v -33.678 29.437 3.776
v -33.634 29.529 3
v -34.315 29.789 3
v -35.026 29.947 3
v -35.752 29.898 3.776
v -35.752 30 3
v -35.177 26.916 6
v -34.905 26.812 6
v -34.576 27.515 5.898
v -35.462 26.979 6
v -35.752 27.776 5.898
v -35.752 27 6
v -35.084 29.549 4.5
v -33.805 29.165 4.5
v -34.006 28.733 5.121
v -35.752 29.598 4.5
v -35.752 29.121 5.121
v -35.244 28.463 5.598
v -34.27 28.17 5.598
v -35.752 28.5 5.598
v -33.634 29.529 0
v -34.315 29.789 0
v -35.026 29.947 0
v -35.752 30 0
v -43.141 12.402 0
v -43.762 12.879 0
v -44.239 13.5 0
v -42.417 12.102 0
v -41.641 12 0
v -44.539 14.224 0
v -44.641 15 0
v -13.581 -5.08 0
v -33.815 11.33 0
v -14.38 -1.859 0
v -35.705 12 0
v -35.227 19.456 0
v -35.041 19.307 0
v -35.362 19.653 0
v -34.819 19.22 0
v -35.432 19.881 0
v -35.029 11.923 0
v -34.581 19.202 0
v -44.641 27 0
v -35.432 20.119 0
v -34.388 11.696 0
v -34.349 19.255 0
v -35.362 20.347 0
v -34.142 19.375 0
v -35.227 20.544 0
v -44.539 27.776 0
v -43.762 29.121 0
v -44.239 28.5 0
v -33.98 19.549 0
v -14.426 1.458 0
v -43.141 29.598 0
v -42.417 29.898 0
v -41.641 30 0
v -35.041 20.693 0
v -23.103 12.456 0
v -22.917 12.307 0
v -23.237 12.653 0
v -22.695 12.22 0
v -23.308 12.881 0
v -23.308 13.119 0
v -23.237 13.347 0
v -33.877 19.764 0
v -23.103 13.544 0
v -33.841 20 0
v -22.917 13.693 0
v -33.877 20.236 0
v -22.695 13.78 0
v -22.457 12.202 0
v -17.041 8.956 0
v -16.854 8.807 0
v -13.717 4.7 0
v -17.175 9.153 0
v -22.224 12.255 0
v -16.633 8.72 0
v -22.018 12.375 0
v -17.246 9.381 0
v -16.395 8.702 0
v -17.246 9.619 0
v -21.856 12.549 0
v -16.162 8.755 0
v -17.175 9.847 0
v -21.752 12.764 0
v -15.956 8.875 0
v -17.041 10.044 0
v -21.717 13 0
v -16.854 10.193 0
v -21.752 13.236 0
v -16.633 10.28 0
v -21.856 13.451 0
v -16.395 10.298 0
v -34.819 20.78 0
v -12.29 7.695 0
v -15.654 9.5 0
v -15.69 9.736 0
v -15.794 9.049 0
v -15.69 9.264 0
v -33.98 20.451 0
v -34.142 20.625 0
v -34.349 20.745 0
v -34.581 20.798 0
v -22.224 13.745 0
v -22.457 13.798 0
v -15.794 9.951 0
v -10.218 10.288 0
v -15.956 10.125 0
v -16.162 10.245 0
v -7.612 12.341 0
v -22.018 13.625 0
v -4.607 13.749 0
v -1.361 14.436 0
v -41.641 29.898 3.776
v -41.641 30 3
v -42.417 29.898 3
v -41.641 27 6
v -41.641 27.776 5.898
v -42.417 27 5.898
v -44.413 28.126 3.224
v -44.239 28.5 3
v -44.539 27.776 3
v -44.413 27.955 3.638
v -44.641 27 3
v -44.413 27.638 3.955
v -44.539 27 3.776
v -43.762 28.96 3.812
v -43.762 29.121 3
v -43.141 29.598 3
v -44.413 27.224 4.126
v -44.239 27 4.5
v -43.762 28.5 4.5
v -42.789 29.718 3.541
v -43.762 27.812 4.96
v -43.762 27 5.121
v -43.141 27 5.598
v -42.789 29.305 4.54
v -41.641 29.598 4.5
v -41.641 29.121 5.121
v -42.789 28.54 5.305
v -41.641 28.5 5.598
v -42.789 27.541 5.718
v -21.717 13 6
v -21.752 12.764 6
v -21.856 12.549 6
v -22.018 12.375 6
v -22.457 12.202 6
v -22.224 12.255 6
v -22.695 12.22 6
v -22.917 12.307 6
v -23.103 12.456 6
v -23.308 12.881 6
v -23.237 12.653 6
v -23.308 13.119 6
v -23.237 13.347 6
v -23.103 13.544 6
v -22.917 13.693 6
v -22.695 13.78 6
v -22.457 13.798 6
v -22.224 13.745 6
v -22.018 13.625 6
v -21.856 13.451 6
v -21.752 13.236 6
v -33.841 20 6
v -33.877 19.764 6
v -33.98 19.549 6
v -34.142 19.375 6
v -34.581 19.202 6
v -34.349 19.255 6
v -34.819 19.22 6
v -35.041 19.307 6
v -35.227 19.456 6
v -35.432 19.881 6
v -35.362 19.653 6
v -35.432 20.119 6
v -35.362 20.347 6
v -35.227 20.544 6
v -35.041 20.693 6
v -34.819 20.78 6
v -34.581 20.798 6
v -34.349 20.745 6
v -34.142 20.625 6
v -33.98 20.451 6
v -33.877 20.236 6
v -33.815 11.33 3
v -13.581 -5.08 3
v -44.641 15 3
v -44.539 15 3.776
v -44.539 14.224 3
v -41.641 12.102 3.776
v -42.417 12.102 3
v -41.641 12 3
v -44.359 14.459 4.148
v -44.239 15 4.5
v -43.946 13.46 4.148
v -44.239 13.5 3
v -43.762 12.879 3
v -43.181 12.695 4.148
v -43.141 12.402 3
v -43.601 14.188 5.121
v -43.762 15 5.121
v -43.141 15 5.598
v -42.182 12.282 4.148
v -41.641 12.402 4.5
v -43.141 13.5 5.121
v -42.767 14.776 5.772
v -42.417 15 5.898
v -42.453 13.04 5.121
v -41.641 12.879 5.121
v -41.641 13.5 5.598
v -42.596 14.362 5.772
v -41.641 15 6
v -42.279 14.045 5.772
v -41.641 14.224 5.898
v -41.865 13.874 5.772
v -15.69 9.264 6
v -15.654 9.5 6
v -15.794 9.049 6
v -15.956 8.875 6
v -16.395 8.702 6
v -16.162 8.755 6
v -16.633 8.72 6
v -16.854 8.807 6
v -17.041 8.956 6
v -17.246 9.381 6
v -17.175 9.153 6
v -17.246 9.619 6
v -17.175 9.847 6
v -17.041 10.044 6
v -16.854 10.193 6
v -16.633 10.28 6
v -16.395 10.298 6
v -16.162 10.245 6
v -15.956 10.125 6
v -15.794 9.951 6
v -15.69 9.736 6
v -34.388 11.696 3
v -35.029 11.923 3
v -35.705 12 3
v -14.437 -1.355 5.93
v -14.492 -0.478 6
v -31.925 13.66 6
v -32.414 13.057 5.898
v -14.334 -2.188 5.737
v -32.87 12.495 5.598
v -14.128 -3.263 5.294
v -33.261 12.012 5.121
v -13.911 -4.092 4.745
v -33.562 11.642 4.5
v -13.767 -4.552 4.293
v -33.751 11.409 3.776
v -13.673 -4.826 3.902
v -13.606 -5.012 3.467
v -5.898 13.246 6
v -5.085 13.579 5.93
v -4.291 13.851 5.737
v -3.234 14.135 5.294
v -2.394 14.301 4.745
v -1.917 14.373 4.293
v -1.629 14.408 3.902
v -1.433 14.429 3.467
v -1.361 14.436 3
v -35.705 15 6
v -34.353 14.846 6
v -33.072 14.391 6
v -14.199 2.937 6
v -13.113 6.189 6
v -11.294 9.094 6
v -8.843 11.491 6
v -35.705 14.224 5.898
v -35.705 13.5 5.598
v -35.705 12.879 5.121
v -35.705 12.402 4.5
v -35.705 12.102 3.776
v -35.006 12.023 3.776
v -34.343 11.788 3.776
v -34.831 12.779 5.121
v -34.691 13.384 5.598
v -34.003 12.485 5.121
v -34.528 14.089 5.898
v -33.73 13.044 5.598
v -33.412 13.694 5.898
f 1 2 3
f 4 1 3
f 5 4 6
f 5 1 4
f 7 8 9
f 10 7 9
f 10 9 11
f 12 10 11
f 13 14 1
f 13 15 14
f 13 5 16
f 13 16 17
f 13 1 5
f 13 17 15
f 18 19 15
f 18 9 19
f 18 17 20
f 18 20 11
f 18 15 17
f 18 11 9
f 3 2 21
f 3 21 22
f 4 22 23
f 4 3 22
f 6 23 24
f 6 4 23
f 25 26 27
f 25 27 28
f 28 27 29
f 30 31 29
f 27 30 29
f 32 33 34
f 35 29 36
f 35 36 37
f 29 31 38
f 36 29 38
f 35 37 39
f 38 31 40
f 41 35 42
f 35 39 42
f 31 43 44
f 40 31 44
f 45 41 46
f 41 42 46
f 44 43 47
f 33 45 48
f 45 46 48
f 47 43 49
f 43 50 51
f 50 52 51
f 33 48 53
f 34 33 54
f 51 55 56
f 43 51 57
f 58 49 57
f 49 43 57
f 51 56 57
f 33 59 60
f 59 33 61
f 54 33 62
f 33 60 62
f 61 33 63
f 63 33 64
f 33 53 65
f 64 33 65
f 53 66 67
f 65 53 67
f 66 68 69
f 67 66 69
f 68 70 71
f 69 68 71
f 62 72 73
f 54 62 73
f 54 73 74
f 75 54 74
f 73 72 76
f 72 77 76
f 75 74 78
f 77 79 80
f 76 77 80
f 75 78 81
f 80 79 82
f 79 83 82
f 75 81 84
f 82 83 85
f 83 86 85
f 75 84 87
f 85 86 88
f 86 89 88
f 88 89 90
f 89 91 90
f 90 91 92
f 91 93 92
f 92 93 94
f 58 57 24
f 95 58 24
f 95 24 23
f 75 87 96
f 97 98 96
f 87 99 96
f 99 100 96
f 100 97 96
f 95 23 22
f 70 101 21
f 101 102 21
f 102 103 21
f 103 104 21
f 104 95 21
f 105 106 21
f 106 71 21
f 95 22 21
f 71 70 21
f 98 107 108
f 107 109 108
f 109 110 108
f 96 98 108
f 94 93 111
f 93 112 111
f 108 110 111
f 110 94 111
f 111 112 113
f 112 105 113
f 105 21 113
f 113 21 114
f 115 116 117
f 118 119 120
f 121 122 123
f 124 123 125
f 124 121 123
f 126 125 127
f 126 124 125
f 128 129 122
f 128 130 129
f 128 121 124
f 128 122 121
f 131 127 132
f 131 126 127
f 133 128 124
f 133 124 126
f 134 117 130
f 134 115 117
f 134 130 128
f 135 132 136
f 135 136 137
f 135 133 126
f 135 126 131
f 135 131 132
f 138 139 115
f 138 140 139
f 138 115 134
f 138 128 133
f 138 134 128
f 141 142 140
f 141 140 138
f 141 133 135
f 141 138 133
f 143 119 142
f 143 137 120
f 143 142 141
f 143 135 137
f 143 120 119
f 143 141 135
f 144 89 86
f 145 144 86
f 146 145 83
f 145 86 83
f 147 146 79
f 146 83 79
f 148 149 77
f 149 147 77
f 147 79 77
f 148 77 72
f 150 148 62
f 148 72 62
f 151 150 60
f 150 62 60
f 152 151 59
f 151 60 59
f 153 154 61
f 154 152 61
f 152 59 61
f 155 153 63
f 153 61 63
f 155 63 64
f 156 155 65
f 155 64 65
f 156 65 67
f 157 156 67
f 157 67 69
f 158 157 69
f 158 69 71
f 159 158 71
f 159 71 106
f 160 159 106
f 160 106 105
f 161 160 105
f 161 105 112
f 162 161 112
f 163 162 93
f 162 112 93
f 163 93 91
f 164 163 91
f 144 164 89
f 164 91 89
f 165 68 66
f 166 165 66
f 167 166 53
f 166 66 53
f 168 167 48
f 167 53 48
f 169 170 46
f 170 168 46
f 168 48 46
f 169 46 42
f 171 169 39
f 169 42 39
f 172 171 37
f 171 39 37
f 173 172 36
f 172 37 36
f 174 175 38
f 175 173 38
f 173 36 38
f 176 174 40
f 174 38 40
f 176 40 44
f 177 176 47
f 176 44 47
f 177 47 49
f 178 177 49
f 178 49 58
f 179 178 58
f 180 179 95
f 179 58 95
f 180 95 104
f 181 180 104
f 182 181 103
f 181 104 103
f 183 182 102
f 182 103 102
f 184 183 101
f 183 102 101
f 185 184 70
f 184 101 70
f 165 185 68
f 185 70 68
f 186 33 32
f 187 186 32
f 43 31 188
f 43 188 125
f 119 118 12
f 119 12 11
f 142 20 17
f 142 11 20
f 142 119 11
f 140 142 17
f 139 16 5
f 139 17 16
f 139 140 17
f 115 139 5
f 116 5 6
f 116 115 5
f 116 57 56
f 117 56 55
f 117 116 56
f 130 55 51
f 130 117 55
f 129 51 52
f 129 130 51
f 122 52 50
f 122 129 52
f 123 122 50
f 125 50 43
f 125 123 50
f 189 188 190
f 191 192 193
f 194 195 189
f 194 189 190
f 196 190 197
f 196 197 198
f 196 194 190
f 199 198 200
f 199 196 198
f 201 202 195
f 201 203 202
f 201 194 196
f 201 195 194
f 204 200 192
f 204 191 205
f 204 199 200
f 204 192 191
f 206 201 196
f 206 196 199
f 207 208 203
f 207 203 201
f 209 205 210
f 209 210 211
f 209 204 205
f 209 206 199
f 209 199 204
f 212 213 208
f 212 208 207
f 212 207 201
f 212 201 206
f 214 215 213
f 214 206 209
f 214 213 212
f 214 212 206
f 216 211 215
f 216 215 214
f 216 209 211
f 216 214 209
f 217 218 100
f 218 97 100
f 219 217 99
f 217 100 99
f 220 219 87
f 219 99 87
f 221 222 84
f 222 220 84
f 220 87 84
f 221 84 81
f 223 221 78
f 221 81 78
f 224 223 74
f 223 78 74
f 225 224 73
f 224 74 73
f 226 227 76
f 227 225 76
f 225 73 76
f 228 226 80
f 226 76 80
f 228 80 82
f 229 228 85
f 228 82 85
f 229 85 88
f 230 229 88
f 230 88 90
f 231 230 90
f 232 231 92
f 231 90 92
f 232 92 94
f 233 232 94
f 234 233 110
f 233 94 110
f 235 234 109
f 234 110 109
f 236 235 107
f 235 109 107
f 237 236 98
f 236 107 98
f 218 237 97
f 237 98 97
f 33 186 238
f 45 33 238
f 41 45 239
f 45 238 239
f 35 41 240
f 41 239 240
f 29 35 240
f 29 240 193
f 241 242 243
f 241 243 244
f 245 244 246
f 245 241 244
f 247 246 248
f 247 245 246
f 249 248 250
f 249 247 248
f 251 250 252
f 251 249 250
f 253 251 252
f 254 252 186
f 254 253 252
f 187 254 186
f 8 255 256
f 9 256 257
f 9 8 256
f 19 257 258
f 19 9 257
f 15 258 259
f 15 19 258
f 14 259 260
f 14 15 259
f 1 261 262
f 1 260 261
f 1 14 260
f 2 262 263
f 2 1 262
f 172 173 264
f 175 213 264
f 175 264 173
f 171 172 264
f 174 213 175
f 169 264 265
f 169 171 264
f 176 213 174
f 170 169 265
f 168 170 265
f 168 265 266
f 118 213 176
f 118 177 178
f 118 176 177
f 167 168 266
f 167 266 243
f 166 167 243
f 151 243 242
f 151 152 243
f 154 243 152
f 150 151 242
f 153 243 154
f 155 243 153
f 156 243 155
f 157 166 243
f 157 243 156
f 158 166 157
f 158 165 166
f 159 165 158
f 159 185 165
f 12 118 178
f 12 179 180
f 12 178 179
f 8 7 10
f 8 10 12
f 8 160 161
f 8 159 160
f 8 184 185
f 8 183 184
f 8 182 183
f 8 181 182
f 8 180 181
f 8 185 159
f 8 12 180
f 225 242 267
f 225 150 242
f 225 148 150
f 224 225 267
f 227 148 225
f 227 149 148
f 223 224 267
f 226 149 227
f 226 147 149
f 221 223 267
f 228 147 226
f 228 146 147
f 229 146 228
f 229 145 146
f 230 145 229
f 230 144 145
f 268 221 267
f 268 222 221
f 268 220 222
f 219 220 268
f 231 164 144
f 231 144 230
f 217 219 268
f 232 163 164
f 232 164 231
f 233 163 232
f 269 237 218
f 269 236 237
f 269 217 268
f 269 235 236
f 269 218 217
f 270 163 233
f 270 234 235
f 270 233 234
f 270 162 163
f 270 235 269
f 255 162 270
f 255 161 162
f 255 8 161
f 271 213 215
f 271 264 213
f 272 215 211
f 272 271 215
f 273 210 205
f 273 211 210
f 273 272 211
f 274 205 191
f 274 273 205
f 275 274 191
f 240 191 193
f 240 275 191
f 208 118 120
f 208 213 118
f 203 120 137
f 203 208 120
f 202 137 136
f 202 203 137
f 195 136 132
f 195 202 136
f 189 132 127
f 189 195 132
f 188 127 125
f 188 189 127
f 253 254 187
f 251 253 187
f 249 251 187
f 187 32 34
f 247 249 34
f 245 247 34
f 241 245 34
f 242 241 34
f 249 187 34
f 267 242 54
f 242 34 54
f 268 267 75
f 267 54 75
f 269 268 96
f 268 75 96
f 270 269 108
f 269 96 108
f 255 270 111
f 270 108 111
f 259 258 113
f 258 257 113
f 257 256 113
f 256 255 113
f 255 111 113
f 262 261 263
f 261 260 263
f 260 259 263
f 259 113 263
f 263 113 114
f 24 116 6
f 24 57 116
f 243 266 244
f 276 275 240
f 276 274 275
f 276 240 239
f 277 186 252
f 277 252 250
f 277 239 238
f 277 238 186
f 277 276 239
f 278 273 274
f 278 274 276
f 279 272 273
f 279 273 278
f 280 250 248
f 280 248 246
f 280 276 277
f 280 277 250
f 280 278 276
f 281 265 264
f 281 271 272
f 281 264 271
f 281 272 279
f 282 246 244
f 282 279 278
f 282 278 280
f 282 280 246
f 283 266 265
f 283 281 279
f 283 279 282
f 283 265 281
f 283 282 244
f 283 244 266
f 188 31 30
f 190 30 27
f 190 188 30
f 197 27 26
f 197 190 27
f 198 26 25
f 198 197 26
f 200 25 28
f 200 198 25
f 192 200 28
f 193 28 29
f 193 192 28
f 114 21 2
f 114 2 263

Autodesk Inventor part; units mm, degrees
ref_plane "YZ Plane" through (0, 0, 0) normal (1, 0, 0) x (0, 1, 0)
ref_plane "XZ Plane" through (0, 0, 0) normal (0, 1, 0) x (-1, 0, 0)
ref_plane "XY Plane" through (0, 0, 0) normal (0, 0, 1) x (1, 0, 0)
sketch "Szkic1" plane through (0, 0, 0) normal (0, 0, 1) x (1, 0, 0)
  circle A0 centre (0, 0) radius 4
  circle A1 centre (0, 0) radius 12.5 construction
  line L0 (0, 0) -> (-34.641, 20) construction
  line L1 (-44.641, 20) -> (-84.641, 20) construction
  line L2 (-34.641, 20) -> (-34.641, 30) construction
  line L3 (-34.641, 30) -> (5.2954, 11.3229)
  line L4 (-34.641, 20) -> (-34.641, 12) construction
  line L5 (-34.641, 12) -> (-7.8737, -9.7085)
  line L6 (-84.641, 20) -> (-84.641, 30)
  line L7 (-84.641, 30) -> (-34.641, 30)
  line L8 (-34.641, 12) -> (-39.641, 12)
  line L9 (-39.641, 12) -> (-39.641, 15) construction
  line L10 (-39.641, 20) -> (-34.641, 30) construction
  line L11 (-42.641, 20) -> (-37.641, 30) construction
  arc A2 (-1.3611, 14.436) -> (-13.5811, -5.0798) centre (0, 0) ccw
  line L12 (-104.0692, 0) -> (31.9282, 0) construction
  line L13 (-20.4848, 0.5192) -> (-10.0924, 18.5194) construction
  line L14 (-39.641, 12) -> (-44.641, 12)
  line L15 (-44.641, 12) -> (-44.641, 15)
  line L16 (-44.641, 15) -> (-39.641, 15) construction
  arc A3 (-39.641, 15) -> (-44.641, 20) centre (-44.641, 15) ccw
  arc A4 (-39.641, 15) -> (-36.641, 12) centre (-36.641, 15) ccw
  circle A5 centre (-76.641, 25) radius 0.75
  circle A6 centre (-69.641, 25) radius 0.75
  line L17 (-76.641, 25) -> (-69.641, 25) construction
  circle A7 centre (-59.641, 25) radius 0.75
  circle A8 centre (-49.641, 25) radius 0.75
  line L18 (-44.641, 20) -> (-44.641, 30)
  line L19 (-44.641, 15) -> (-44.641, 20)
  circle A9 centre (-16.4545, 9.5) radius 0.8
  circle A10 centre (-22.5167, 13) radius 0.8
  circle A11 centre (-34.641, 20) radius 0.8
  dimension "d0" = 25
  dimension "d1" = 29
  dimension "d2" = 8
  dimension "d4" = 40
  dimension "d5" = 30
  dimension "d6" = 50
  dimension "d7" = 10
  dimension "d8" = 5
  dimension "d9" = 3
  dimension "d10" = 8
  dimension "d11" = 22
  dimension "d16" = 5
  dimension "d17" = 3
  dimension "d20" = 5
  dimension "d21" = 3
  dimension "d23" = 1.5
  dimension "d24" = 1.5
  dimension "d25" = 8
  dimension "d26" = 5
  dimension "d27" = 15
  dimension "d31" = 10
  dimension "d43" = 1.6
  dimension "d45" = 19
  dimension "d46" = 7
extrude "Wyciągnięcie proste3" add sketch "Szkic1" along normal blind 6 contours L3 A2 L5 L8 A4 A3 L18 L7 | A3 A4 L8 L14 L15 L19
fillet "Zaokrąglenie4" radius 5 1 edges at (-34.641, 30, 3)
fillet "Zaokrąglenie6" radius 3 2 edges at (-44.641, 12, 3) (-34.641, 12, 3)
fillet "Zaokrąglenie8" radius 3 9 edges at (-34.6675, 29.8809, 6) (-40.1967, 30, 6) (-44.641, 30, 3) (-17.4977, 21.9826, 6) (-43.7623, 12.8787, 6) (-38.6728, 12, 6) (-34.7022, 11.8276, 6) (-23.698, 3.1251, 6) (-44.641, 22.5, 6)
properties part number "palec2" material "PLA"
